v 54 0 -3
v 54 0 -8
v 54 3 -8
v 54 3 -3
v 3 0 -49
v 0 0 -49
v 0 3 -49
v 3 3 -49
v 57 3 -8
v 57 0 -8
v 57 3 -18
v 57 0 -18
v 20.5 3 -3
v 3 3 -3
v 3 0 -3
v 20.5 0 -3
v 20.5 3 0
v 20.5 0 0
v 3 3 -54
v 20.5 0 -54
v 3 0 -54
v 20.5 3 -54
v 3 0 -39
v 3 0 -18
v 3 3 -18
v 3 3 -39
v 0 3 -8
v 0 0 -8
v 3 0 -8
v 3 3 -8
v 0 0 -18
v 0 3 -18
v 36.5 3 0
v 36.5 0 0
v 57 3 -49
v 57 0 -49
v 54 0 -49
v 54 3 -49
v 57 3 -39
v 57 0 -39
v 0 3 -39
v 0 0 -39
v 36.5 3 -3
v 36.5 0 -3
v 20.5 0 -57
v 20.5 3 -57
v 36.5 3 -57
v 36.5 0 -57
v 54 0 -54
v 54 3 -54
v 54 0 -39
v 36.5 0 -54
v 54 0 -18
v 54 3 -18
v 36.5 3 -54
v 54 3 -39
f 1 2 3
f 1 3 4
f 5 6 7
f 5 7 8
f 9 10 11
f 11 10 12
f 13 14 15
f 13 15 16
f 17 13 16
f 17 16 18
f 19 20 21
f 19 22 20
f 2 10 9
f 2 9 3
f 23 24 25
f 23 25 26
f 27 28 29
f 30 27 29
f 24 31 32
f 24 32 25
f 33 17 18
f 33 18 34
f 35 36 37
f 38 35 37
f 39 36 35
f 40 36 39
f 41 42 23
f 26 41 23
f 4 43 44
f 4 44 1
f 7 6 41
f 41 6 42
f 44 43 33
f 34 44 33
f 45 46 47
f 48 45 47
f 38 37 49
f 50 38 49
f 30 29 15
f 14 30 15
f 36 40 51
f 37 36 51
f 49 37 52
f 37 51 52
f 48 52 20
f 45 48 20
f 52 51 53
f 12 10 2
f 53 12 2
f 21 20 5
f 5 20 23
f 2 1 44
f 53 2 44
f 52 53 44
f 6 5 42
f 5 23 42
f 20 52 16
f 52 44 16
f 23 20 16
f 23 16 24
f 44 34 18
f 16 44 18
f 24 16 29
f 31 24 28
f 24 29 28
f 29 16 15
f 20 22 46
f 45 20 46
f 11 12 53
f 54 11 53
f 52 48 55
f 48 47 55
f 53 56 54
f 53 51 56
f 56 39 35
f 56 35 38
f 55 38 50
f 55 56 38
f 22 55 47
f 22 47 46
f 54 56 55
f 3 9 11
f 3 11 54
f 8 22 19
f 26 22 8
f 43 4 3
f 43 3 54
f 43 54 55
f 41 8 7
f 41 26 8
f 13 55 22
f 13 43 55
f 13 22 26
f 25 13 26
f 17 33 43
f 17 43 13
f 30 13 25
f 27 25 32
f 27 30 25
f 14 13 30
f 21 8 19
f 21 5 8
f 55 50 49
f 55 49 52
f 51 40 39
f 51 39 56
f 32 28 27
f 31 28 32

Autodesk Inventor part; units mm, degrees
ref_plane "YZ Plane" through (0, 0, 0) normal (1, 0, 0) x (0, 1, 0)
ref_plane "XZ Plane" through (0, 0, 0) normal (0, 1, 0) x (-1, 0, 0)
ref_plane "XY Plane" through (0, 0, 0) normal (0, 0, 1) x (1, 0, 0)
sketch "Sketch1" plane through (0, 0, 0) normal (0, 1, 0) x (-1, 0, 0)
  line L0 (-28.5, -57) -> (-28.5, -28.5) construction
  line L1 (-28.5, -28.5) -> (-57, -28.5) construction
  line L2 (0, -49) -> (-3, -49)
  line L3 (-3, -49) -> (-3, -57)
  line L4 (0, -49) -> (0, -39)
  line L5 (0, -39) -> (-3, -39)
  line L6 (-3, -39) -> (-3, -28.5)
  line L7 (0, -8) -> (-3, -8)
  line L8 (-3, -8) -> (-3, 0)
  line L9 (0, -18) -> (-3, -18)
  line L10 (-3, -18) -> (-3, -28.5)
  line L11 (0, -8) -> (0, -18)
  line L12 (0, -39) -> (0, -49)
  line L13 (0, -49) -> (0, -39)
  line L14 (0, -18) -> (0, -8)
  line L15 (-57, -49) -> (-54, -49)
  line L16 (-54, -49) -> (-54, -57)
  line L17 (-57, -49) -> (-57, -39)
  line L18 (-57, -39) -> (-54, -39)
  line L19 (-54, -39) -> (-54, -28.5)
  line L20 (-57, -8) -> (-54, -8)
  line L21 (-54, -8) -> (-54, 0)
  line L22 (-57, -18) -> (-54, -18)
  line L23 (-54, -18) -> (-54, -28.5)
  line L24 (-57, -8) -> (-57, -18)
  line L25 (-57, -39) -> (-57, -49)
  line L26 (-57, -49) -> (-57, -39)
  line L27 (-57, -18) -> (-57, -8)
  line L28 (-57, -49) -> (-57, -39)
  line L29 (-57, -18) -> (-57, -8)
  line L30 (-28.5, -54) -> (-36.5, -54)
  line L31 (-36.5, -54) -> (-36.5, -57)
  line L32 (-28.5, -54) -> (-20.5, -54)
  line L33 (-20.5, -54) -> (-20.5, -57)
  line L34 (-3, -57) -> (-20.5, -57)
  line L35 (-36.5, -57) -> (-54, -57)
  line L36 (-28.5, -3) -> (-36.5, -3)
  line L37 (-36.5, -3) -> (-36.5, 0)
  line L38 (-20.5, -3) -> (-20.5, 0)
  line L39 (-28.5, -3) -> (-20.5, -3)
  line L40 (-54, 0) -> (-36.5, 0)
  line L41 (-20.5, 0) -> (-3, 0)
  point P0 (0, 0)
  point P1 (0, -57)
  dimension "d3" = 3
  dimension "d4" = 10
  dimension "d5" = 3
  dimension "d6" = 3
  dimension "d7" = 8
extrude "Extrusion1" add sketch "Sketch1" along normal blind 3
sketch "Sketch2" plane through (0, 3, 0) normal (0, 1, 0) x (1, 0, 0)
  line L0 (36.5, 0) -> (54, 0) projected
  line L1 (36.5, 3) -> (36.5, 0) projected
  line L2 (36.5, 0) -> (36.5, 3)
  line L3 (36.5, 3) -> (54, 3)
  line L4 (54, 0) -> (54, 8) projected
  line L5 (20.5, 0) -> (20.5, 3) projected
  line L6 (20.5, 0) -> (20.5, 3)
  line L7 (20.5, 3) -> (36.5, 3) projected
  line L8 (20.5, 3) -> (36.5, 3)
  line L9 (36.5, 3) -> (36.5, 0)
  line L10 (3, 0) -> (20.5, 0) projected
  line L11 (20.5, 0) -> (20.5, 3)
  line L12 (3, 0) -> (3, 3)
  line L13 (3, 8) -> (3, 0) projected
  line L14 (20.5, 3) -> (3, 3)
  point P0 (0, 0)
extrude "Extrusion2" cut sketch "Sketch2" against normal up to surface (3 mm away)
sketch "Sketch3" plane through (0, 3, 0) normal (0, 1, 0) x (1, 0, 0)
  line L0 (3, 3) -> (20.5, 3)
  line L1 (3, 3) -> (54, 3) projected
  line L2 (20.5, 3) -> (20.5, 0)
  line L3 (36.5, 54) -> (20.5, 54) projected
  line L4 (28.5, 54) -> (28.5, 14.4088) construction
  line L5 (54, 3) -> (36.5, 3)
  line L6 (36.5, 3) -> (36.5, 0)
  line L7 (20.5, 0) -> (36.5, 0)
  point P0 (0, 0)
  dimension "d12" = 17.5
extrude "Extrusion3" add sketch "Sketch3" against normal up to surface (3 mm away)
sketch "Sketch4" plane through (0, 3, 0) normal (0, 1, 0) x (1, 0, 0)
  line L0 (36.5, 54) -> (20.5, 54) projected
  line L1 (20.5, 54) -> (3, 54)
  line L2 (3, 57) -> (3, 49) projected
  line L3 (36.5, 57) -> (36.5, 54) projected
  line L4 (36.5, 54) -> (54, 54)
  line L5 (54, 49) -> (54, 57) projected
  line L6 (20.5, 57) -> (3, 57) projected
  line L7 (3, 54) -> (3, 57)
  line L8 (3, 57) -> (20.5, 57)
  line L9 (20.5, 57) -> (20.5, 54)
  line L10 (36.5, 57) -> (36.5, 54)
  line L11 (54, 57) -> (36.5, 57) projected
  line L12 (36.5, 57) -> (54, 57)
  line L13 (54, 57) -> (54, 54)
  point P0 (0, 0)
extrude "Extrusion4" cut sketch "Sketch4" against normal up to surface (3 mm away)
sketch "Sketch5" plane through (0, 3, 0) normal (0, 1, 0) x (1, 0, 0)
  line L0 (54, 18) -> (54, 39) projected
  line L1 (54, 28.5) -> (3, 28.5) construction
  line L2 (3, 39) -> (3, 18) projected
  line L3 (3, 3) -> (20.5, 3) projected
  line L4 (3, 3) -> (20.5, 3)
  line L5 (20.5, 3) -> (20.5, 0)
  line L6 (20.5, 0) -> (36.5, 0) projected
  line L7 (20.5, 0) -> (36.5, 0)
  line L8 (36.5, 0) -> (36.5, 3)
  line L9 (36.5, 3) -> (54, 3) projected
  line L10 (36.5, 3) -> (54, 3)
  line L11 (3, 54) -> (20.5, 54)
  line L12 (20.5, 54) -> (20.5, 57)
  line L13 (20.5, 57) -> (36.5, 57)
  line L14 (36.5, 57) -> (36.5, 54)
  line L15 (36.5, 54) -> (54, 54)
  line L16 (20.5, 54) -> (36.5, 54)
  line L17 (54, 54) -> (3, 54) projected
  point P0 (0, 0)
extrude "Extrusion5" add sketch "Sketch5" against normal up to surface (3 mm away)
properties part number "Inferior" material "LCP Plastic"
